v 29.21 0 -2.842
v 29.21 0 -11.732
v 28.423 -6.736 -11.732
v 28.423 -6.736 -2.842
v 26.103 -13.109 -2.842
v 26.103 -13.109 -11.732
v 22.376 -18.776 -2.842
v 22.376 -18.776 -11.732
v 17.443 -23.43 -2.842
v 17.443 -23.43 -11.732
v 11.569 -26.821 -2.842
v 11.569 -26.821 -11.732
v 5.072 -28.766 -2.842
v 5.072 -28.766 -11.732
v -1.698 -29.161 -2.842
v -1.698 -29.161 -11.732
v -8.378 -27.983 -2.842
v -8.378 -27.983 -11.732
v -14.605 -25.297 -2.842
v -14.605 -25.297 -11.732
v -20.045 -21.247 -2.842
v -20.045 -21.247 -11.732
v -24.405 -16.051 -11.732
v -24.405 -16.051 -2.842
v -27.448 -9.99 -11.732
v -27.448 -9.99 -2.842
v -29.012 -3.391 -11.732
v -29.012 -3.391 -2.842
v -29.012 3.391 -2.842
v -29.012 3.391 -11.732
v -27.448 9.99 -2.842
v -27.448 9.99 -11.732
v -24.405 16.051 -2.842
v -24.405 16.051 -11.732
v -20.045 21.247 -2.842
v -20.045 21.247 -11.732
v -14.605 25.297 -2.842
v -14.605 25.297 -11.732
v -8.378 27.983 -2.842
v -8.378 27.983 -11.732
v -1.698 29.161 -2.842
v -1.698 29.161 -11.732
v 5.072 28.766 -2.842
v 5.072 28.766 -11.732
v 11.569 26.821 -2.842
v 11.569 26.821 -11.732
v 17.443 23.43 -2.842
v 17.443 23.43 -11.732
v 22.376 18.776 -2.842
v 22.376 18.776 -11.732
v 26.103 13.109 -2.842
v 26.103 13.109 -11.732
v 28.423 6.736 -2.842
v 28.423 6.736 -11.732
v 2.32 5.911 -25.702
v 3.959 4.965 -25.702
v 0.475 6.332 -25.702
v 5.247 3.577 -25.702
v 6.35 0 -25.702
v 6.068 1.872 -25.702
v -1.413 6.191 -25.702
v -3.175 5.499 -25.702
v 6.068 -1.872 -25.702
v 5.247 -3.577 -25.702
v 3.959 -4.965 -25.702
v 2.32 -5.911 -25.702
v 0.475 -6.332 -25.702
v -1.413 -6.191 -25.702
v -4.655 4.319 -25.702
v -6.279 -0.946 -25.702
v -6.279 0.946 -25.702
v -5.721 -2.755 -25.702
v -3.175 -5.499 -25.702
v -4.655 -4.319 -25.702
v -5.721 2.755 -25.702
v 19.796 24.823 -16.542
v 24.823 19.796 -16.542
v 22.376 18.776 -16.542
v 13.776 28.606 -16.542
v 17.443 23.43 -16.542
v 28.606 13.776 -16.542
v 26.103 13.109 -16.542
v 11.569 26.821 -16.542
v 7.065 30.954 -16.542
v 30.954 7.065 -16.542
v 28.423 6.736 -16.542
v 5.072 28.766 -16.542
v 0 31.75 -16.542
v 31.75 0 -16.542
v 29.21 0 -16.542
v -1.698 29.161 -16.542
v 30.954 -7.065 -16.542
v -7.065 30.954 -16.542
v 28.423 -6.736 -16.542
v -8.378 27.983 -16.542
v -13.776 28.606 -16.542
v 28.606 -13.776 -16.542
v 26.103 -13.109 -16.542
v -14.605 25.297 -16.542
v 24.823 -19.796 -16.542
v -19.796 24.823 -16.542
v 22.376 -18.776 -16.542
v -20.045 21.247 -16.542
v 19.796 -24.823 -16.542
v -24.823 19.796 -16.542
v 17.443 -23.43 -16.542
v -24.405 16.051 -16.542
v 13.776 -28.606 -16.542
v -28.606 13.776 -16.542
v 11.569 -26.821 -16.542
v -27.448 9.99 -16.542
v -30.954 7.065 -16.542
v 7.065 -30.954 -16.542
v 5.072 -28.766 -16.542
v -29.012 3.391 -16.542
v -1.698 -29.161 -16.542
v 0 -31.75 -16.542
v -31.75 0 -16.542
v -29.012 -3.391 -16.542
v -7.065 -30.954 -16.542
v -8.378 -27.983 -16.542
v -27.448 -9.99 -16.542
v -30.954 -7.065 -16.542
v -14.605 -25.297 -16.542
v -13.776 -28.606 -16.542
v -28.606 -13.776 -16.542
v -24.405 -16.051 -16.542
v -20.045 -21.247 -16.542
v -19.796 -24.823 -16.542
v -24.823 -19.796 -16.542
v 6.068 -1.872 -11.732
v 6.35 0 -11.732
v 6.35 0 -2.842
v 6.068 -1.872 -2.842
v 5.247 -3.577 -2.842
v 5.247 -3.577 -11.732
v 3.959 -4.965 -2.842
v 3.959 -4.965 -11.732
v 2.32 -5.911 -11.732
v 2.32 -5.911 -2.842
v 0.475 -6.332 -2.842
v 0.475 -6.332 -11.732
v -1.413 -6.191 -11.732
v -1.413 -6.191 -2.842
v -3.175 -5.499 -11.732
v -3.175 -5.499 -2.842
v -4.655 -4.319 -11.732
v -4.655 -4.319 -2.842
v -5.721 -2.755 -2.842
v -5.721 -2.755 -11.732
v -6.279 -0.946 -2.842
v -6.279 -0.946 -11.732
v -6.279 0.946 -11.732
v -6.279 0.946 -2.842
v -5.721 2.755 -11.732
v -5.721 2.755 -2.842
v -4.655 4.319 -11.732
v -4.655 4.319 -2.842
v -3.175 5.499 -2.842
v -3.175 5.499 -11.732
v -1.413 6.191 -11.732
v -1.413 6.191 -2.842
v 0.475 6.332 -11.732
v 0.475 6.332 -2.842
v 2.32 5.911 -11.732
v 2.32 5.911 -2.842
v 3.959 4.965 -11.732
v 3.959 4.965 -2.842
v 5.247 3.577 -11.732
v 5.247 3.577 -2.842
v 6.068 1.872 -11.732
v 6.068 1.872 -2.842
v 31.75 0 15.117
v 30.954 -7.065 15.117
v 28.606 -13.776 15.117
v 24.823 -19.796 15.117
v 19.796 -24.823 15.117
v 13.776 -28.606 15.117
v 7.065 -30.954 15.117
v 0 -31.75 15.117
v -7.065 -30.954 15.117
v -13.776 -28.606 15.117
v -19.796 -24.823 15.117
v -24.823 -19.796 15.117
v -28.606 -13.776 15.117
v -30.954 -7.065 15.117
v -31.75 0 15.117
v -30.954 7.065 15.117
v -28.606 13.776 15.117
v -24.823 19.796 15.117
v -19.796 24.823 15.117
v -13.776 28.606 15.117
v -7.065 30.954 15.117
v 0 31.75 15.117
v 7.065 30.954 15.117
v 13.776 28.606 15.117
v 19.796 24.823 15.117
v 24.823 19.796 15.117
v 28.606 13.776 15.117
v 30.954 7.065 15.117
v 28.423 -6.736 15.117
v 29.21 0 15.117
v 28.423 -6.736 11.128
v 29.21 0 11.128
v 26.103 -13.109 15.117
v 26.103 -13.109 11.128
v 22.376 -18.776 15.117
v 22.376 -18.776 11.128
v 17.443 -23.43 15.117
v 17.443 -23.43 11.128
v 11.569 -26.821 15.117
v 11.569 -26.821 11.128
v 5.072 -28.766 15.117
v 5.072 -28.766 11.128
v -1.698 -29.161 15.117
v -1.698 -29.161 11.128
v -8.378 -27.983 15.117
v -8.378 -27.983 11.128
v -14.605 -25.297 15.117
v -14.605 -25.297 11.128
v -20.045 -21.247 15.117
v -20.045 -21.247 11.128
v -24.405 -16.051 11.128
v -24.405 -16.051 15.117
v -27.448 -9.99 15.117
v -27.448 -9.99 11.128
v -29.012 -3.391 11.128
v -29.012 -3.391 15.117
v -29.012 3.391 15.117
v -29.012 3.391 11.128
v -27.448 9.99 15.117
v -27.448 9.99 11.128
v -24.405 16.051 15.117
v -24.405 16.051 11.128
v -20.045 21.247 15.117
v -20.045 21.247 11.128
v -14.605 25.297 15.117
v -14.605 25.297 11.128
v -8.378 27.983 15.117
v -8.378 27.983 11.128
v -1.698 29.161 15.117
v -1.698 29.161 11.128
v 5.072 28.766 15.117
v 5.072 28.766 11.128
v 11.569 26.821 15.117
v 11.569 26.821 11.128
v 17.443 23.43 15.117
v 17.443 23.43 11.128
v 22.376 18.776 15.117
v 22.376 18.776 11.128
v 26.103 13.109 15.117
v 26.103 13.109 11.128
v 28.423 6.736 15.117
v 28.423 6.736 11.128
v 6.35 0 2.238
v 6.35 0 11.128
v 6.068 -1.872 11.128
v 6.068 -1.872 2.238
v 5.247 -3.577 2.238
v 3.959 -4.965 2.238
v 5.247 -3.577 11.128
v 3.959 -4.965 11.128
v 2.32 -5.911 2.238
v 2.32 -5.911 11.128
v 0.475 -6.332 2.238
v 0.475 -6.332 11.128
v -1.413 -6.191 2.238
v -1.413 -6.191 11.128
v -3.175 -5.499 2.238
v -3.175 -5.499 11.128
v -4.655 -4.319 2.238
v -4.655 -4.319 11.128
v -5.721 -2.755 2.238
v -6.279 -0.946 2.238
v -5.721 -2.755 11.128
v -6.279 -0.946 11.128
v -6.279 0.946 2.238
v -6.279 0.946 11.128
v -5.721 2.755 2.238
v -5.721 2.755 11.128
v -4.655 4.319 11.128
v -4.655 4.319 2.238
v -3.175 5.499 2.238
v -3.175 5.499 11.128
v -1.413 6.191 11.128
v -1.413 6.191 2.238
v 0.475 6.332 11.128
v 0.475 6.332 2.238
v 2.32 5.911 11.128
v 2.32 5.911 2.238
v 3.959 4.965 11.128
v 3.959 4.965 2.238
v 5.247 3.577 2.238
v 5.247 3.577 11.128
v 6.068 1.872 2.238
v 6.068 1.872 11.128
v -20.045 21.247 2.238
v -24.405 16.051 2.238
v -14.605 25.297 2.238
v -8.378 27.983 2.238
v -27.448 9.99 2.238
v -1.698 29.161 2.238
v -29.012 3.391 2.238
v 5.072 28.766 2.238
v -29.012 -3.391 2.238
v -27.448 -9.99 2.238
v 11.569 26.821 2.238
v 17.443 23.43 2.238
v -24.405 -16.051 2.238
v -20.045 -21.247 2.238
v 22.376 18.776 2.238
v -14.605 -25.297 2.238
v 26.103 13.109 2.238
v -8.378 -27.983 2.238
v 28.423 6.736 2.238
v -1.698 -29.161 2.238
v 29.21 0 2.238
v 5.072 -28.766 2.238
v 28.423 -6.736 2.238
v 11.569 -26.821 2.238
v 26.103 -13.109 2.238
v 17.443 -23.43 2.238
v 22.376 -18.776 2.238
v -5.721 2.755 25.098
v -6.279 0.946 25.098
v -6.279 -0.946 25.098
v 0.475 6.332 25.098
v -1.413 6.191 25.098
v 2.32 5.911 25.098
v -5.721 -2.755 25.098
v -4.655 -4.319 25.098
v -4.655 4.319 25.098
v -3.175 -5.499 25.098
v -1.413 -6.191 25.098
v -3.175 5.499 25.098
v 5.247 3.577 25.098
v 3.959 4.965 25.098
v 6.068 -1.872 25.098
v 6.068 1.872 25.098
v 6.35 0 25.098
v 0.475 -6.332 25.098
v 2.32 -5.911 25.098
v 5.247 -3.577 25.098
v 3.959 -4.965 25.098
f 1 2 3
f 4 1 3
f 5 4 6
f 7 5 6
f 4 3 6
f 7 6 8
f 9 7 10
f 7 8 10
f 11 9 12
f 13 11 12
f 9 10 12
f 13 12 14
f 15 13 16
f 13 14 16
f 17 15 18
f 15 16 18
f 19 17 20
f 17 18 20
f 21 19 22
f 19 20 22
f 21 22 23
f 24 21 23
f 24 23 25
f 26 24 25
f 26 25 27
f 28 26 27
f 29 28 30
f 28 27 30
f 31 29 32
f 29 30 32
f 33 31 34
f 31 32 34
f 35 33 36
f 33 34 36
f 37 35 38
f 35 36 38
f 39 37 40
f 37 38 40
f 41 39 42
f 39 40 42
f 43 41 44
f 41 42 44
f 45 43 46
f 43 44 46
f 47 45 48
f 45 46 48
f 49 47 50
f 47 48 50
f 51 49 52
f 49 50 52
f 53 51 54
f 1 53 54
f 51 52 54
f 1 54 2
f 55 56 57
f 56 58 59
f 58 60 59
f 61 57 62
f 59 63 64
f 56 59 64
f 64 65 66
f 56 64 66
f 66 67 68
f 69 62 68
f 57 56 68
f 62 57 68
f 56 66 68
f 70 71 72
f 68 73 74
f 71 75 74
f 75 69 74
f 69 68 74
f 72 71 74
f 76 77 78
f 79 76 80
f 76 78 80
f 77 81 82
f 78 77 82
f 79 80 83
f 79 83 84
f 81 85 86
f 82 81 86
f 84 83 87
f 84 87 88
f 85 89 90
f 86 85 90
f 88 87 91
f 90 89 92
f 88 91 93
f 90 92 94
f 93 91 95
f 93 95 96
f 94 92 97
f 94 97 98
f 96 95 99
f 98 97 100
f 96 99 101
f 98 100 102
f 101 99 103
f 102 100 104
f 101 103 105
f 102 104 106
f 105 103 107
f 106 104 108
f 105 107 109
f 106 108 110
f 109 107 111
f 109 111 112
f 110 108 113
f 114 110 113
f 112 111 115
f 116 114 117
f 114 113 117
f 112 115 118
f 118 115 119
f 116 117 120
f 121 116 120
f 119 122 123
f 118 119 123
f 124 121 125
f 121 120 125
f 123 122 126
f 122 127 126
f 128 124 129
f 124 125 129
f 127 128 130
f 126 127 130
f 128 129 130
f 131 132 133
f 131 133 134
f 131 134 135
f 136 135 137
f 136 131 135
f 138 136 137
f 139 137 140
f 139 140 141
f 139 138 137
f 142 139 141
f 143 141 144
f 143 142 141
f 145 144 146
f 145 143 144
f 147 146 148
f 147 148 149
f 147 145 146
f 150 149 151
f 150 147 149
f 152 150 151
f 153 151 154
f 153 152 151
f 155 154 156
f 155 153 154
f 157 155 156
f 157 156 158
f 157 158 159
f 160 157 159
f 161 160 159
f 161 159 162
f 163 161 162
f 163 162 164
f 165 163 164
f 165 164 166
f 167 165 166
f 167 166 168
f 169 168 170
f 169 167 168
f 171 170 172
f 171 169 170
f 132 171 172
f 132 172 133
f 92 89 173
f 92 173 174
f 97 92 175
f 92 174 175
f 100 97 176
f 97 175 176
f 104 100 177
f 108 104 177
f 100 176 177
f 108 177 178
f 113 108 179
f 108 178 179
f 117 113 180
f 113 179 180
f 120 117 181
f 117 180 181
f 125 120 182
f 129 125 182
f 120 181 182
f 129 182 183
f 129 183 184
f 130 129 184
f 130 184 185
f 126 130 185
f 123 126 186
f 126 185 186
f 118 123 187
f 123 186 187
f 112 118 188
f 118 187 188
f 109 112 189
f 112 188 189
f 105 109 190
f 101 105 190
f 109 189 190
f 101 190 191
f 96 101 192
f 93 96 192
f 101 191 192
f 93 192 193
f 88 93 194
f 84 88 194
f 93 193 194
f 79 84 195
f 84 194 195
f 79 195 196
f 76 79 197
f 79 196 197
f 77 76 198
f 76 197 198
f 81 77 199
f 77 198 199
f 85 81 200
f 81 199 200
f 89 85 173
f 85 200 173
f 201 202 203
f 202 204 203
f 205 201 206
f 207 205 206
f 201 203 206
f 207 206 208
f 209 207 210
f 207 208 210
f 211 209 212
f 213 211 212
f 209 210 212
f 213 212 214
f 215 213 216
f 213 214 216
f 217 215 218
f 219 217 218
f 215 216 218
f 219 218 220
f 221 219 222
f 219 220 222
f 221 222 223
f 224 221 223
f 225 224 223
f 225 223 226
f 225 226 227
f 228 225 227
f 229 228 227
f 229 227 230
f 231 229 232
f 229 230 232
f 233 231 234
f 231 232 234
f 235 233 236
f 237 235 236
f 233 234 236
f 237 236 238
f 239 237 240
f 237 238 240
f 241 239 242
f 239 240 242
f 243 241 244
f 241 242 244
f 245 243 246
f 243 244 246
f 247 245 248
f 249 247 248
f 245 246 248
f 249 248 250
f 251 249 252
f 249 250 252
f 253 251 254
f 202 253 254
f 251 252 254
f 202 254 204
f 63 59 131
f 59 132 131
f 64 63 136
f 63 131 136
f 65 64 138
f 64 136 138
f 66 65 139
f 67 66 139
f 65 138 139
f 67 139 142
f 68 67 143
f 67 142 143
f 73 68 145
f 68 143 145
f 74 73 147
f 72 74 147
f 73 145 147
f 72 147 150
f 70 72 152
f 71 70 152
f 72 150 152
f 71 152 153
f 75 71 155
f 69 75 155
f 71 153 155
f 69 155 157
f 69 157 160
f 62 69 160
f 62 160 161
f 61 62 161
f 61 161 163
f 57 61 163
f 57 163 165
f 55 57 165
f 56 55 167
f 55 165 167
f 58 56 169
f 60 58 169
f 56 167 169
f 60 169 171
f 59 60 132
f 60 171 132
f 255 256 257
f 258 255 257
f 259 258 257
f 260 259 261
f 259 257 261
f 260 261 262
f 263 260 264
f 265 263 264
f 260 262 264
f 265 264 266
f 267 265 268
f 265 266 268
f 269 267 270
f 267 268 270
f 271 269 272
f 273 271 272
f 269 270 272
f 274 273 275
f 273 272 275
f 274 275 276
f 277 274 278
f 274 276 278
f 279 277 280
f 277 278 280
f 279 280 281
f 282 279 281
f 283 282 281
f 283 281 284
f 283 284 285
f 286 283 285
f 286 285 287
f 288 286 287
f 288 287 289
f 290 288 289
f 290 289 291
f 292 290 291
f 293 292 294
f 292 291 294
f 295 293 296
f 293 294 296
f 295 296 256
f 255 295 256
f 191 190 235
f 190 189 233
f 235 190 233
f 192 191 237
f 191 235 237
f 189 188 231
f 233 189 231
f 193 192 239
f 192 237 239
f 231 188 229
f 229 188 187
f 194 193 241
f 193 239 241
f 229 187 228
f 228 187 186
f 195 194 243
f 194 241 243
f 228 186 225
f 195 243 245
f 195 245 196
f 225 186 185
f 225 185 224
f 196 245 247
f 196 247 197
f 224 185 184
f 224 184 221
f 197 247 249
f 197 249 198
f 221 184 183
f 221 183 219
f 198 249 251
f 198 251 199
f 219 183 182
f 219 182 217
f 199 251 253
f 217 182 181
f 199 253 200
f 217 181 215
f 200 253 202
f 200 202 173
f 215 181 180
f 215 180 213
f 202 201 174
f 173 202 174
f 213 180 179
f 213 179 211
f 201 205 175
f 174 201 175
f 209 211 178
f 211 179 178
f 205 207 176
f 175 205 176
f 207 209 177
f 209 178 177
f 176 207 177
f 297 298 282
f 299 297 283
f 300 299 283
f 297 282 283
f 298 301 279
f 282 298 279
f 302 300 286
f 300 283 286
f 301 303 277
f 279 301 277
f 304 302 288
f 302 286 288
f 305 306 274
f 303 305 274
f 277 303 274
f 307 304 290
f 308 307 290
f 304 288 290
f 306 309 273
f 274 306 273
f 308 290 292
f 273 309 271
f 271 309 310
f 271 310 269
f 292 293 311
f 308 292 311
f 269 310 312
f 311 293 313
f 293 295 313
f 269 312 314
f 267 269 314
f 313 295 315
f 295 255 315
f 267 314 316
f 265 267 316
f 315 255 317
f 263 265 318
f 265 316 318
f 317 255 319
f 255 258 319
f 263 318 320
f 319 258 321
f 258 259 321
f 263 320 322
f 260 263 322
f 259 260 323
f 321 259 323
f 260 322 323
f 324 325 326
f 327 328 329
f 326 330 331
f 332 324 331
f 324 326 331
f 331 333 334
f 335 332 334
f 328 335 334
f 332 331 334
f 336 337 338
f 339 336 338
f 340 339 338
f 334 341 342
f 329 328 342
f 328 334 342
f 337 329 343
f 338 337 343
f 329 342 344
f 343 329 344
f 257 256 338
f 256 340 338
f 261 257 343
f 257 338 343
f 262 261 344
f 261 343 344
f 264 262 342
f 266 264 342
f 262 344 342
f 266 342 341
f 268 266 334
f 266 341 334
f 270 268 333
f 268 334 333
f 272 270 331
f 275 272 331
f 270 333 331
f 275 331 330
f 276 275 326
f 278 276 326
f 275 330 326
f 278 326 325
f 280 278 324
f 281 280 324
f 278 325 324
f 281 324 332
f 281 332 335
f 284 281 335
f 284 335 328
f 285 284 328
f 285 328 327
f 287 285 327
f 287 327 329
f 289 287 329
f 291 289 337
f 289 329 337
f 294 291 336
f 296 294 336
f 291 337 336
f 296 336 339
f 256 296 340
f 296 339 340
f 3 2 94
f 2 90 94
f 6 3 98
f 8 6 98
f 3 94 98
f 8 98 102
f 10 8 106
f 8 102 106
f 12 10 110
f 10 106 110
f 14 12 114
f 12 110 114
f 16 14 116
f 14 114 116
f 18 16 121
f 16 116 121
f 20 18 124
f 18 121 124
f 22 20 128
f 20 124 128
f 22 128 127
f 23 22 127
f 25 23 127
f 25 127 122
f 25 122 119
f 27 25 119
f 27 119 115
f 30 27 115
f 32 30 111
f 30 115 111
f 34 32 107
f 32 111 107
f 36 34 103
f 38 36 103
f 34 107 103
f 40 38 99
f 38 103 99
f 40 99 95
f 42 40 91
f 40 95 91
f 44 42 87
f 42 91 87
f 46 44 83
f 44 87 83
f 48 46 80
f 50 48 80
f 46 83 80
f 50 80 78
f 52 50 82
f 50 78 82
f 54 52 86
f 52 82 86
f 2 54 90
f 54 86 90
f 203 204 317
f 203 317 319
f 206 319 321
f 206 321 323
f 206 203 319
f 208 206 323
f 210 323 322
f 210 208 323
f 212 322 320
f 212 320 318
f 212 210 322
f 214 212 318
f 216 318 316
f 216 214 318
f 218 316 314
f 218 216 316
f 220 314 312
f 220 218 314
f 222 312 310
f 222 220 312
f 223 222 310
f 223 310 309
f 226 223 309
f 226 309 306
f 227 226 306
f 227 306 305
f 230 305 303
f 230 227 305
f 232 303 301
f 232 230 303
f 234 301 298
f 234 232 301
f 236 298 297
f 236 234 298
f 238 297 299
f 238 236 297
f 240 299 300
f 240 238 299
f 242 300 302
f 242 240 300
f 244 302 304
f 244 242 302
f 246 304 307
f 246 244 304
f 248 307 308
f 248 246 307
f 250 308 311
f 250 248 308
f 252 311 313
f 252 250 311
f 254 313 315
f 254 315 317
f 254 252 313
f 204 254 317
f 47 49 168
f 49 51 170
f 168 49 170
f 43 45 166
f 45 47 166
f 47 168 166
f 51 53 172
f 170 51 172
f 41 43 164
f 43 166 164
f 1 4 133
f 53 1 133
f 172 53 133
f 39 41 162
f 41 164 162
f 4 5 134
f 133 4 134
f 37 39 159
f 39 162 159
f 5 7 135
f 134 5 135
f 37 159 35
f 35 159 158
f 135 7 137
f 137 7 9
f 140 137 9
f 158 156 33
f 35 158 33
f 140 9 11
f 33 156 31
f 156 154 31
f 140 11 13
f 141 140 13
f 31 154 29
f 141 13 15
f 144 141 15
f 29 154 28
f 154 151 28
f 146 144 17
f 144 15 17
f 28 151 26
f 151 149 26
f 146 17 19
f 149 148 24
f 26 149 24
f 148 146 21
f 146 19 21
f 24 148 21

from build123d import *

# Parameters (mm, degrees)
F2_DEPTH = 8.89
F3_DEPTH = 8.89


with BuildPart() as f1:
    # F0 (on Front) → F1 (revolve)
    with BuildSketch(Plane.XZ):
        Polygon((29.21, 15.1165612042), (29.21, 11.1276201193), (29.21, -11.7323798807), (29.21, -16.5423657745), (31.7501313984, -16.5423657745), (31.7501313984, 15.1165612042), align=None)
        Polygon((6.35, 25.0976201193), (0, 25.0976201193), (0, -25.7023798807), (6.35, -25.7023798807), (6.35, -11.7323798807), (29.21, -11.7323798807), (29.21, 11.1276201193), (6.35, 11.1276201193), align=None)
    revolve(axis=Axis((0, 0, -0.3023798807), (0, 0, -1)))

    # F2 (cut): a face of the model
    f2_faces = [f1.faces().sort_by_distance(p)[0] for p in [
        (-28.3838164369, 0, 11.1276201193),
    ]]
    extrude(f2_faces, amount=-F2_DEPTH, mode=Mode.SUBTRACT)

    # F3 (cut): a face of the model
    f3_faces = [f1.faces().sort_by_distance(p)[0] for p in [
        (-7.1761835631, 0, -11.7323798807),
    ]]
    extrude(f3_faces, amount=-F3_DEPTH, mode=Mode.SUBTRACT)


solid = f1.part
